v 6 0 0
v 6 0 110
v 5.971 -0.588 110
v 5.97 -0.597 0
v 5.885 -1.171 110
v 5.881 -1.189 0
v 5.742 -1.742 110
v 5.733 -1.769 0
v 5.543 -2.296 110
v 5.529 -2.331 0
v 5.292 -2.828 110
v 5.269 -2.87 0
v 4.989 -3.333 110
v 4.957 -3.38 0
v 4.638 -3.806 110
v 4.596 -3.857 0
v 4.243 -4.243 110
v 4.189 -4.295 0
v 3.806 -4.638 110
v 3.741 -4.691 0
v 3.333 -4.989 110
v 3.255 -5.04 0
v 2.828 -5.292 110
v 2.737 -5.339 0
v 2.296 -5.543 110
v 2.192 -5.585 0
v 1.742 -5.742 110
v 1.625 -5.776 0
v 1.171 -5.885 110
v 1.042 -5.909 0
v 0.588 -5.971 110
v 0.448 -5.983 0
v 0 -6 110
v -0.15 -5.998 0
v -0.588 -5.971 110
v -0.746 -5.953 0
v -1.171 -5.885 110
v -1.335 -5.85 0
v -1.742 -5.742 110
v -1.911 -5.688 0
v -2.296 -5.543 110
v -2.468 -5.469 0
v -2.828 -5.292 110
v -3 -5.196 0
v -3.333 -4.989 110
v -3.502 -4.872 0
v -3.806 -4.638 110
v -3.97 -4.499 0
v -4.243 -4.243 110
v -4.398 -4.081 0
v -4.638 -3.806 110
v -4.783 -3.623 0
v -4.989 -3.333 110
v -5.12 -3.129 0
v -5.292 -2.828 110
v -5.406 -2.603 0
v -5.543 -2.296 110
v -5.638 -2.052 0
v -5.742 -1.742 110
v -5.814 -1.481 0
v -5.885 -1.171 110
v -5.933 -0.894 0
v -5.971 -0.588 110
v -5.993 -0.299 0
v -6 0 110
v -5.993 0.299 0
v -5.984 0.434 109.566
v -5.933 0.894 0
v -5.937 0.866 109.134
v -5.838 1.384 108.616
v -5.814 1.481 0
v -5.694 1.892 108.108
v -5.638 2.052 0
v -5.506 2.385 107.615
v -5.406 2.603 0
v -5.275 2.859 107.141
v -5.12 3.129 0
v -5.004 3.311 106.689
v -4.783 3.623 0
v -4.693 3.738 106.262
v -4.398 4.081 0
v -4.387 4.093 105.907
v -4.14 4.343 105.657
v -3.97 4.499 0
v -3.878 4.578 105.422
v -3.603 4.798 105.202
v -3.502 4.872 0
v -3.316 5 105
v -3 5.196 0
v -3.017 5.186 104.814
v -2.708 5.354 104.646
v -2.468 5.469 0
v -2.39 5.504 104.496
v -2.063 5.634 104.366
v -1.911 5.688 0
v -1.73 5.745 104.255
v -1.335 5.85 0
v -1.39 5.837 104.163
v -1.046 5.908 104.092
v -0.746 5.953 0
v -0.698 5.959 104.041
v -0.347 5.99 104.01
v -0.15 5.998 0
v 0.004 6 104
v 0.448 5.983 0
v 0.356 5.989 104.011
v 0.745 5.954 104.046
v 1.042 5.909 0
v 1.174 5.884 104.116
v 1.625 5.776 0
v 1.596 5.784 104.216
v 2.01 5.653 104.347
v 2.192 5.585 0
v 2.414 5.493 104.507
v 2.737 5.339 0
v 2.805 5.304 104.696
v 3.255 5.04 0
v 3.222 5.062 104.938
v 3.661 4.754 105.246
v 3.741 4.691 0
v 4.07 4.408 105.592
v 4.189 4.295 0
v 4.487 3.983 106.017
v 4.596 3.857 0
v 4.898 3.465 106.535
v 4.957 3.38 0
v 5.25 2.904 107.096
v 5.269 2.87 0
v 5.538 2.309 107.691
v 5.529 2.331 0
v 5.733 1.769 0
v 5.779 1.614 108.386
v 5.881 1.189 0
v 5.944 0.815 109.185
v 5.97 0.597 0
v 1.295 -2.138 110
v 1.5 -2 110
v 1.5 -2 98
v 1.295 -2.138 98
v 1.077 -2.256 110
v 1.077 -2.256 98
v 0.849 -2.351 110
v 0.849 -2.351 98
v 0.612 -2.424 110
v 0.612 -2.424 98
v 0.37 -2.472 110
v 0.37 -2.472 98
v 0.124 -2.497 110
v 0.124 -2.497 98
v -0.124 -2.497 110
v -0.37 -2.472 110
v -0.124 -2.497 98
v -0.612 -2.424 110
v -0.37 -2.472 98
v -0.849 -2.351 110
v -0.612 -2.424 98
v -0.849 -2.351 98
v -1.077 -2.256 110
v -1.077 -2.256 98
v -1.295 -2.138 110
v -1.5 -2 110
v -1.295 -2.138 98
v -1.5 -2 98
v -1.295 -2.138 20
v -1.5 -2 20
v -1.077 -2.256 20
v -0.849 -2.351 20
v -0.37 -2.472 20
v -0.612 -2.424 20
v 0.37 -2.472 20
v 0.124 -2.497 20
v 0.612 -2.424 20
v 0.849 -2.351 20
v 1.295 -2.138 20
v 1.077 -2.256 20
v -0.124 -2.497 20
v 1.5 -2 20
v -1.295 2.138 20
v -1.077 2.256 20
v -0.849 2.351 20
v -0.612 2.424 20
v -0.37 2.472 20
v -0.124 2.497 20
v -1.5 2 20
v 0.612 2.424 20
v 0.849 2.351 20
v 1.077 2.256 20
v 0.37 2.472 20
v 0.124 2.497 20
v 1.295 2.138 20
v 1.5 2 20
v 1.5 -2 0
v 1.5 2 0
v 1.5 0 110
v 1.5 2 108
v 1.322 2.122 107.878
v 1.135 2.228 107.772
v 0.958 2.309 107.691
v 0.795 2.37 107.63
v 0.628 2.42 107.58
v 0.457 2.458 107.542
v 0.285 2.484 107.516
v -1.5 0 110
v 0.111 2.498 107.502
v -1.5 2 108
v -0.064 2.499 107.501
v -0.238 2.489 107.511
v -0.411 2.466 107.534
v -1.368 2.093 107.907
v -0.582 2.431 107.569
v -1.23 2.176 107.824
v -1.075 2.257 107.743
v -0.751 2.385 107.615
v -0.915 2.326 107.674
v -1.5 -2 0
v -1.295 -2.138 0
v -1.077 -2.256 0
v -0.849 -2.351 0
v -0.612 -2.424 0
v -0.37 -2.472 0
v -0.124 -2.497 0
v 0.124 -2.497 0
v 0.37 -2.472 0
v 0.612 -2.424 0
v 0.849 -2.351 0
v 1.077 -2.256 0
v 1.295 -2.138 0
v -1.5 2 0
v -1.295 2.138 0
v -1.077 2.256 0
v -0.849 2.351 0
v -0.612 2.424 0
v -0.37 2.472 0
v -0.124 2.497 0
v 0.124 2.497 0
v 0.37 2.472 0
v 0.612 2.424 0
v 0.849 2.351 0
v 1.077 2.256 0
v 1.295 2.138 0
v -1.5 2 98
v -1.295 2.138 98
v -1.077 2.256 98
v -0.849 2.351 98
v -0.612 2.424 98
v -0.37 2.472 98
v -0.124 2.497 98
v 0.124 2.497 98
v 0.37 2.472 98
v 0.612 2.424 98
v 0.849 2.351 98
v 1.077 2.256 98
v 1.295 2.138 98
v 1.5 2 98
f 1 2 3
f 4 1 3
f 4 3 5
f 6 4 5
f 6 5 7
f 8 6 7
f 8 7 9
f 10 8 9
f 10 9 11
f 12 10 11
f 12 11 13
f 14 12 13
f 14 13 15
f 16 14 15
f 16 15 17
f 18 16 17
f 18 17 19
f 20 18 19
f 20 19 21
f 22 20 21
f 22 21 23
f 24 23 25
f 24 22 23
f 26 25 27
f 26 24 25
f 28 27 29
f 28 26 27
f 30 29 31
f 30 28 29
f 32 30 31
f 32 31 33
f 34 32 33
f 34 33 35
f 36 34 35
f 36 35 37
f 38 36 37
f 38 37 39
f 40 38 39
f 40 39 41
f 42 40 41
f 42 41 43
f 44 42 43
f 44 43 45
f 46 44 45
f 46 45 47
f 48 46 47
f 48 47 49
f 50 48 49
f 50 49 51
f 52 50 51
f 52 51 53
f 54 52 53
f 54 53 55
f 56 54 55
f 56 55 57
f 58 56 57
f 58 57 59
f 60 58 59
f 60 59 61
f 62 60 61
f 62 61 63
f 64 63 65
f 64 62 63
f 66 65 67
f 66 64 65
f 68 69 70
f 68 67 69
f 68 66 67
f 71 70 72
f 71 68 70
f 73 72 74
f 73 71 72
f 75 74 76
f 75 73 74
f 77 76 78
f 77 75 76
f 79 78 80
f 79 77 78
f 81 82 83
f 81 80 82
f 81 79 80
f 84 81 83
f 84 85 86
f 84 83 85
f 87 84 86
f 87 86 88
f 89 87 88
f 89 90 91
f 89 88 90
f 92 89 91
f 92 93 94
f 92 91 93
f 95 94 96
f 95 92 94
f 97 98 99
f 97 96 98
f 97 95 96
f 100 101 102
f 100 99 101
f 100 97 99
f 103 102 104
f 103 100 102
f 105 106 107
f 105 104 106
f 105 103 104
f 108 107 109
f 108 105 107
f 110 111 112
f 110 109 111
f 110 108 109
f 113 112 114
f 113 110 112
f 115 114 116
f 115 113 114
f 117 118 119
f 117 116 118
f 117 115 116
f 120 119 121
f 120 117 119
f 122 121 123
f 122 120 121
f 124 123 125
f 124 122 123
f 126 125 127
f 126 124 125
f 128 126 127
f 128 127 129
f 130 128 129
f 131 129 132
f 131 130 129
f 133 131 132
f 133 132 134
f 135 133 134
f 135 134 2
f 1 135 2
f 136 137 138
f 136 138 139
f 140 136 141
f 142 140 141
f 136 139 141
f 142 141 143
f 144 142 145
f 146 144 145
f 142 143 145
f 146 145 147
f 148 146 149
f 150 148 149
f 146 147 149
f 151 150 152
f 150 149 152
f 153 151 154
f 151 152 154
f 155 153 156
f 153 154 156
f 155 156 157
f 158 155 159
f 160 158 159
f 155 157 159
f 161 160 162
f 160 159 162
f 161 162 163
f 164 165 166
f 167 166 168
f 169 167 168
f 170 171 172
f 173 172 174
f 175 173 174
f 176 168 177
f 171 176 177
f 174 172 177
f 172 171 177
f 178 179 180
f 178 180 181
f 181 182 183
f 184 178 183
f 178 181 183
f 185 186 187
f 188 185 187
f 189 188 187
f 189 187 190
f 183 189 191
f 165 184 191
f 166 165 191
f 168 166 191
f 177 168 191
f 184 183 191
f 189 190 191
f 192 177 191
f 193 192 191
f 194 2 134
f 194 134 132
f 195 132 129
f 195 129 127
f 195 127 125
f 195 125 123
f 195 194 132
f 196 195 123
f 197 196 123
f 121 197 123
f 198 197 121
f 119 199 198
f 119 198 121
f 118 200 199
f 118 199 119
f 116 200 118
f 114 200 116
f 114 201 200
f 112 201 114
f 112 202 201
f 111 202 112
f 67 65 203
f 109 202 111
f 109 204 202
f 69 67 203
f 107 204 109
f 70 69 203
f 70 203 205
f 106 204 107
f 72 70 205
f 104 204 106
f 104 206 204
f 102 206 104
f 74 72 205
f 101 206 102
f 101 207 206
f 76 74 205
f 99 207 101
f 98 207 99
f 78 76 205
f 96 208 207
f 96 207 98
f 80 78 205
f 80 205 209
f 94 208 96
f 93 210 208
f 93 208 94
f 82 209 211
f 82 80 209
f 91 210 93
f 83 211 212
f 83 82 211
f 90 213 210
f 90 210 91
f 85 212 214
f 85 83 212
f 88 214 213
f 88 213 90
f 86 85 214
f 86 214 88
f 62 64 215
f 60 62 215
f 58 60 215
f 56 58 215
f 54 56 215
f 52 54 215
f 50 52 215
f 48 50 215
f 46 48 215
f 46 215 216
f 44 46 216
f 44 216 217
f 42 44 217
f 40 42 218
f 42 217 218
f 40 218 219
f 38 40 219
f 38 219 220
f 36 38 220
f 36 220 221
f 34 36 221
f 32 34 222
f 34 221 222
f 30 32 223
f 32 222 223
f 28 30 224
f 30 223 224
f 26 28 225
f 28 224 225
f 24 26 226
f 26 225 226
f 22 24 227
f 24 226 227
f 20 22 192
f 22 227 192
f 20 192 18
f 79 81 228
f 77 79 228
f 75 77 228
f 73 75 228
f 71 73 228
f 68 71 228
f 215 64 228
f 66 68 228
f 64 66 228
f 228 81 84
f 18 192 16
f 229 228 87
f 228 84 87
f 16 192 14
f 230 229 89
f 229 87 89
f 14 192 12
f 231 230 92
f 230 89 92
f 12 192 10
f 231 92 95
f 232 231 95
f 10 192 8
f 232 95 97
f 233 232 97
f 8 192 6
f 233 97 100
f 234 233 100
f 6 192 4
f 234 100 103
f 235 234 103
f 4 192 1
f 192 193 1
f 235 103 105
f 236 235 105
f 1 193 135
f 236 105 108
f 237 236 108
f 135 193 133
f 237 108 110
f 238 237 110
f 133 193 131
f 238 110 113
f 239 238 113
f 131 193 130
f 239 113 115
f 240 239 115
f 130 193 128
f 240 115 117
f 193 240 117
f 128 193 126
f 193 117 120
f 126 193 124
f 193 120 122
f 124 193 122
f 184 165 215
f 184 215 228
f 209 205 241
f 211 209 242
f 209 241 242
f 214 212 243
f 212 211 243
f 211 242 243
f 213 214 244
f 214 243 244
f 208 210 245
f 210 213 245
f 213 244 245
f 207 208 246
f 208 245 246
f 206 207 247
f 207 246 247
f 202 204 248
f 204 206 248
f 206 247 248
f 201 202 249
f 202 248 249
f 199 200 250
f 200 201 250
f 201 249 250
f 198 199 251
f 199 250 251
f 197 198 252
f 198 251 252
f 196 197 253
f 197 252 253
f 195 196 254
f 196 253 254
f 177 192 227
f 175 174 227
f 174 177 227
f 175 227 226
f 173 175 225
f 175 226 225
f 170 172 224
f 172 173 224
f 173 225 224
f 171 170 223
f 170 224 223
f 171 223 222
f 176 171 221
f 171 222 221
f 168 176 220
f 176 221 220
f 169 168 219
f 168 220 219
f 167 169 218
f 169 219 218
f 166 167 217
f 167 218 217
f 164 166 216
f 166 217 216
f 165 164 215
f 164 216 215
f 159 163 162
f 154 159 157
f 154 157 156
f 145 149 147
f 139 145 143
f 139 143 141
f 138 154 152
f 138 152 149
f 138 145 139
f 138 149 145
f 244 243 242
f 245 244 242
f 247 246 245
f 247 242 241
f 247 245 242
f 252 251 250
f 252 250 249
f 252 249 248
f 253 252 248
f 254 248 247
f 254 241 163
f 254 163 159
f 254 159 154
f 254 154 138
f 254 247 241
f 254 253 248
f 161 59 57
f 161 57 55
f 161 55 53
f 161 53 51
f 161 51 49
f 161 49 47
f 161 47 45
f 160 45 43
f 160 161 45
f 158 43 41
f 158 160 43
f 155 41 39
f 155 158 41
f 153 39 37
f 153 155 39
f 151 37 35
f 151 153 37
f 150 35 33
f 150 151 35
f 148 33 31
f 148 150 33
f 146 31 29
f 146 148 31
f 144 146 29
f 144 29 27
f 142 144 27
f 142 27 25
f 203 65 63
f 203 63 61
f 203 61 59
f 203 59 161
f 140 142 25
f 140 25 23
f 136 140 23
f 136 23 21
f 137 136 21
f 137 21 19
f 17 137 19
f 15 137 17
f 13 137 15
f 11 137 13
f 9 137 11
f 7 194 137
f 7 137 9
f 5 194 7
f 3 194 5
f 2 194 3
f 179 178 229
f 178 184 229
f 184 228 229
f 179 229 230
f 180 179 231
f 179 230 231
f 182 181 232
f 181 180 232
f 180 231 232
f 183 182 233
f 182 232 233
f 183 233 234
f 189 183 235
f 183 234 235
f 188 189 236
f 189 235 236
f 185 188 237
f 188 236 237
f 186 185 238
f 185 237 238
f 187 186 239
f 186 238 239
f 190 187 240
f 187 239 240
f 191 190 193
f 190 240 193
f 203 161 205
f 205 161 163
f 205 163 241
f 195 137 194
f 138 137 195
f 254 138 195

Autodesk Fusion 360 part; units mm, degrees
sketch "Skizze1" plane through (0, 0, 0) normal (0, 0, 1) x (1, 0, 0)
  point P0 (-5.2, 16.4)
sketch "Skizze2" plane through (0, 0, 0) normal (0, 0, 1) x (1, 0, 0)
  circle A0 centre (0, 0) radius 6
extrude "Extrusion2" add sketch "Skizze2" along normal blind 110
sketch "Skizze3" plane through (0, 0, 0) normal (0, 0, 1) x (1, 0, 0)
  line L0 (-1.5, -2) -> (-1.5, 2)
  line L1 (1.5, -2) -> (1.5, 2)
  arc A0 (-1.5, -2) -> (1.5, -2) centre (0, 0) ccw
  arc A1 (1.5, 2) -> (-1.5, 2) centre (0, 0) ccw
  dimension "d15" = 5
extrude "Extrusion3" cut sketch "Skizze3" along normal blind 20
pattern_linear "R-Anordnung1" count 2 spacing 98 along (0, 0, 1) of "Extrusion3"
ref_plane "Arbeitsebene1" through (-6, 0, 108.0306) normal (-1, 0, 0) x (0, 1, 0)
sketch "Skizze5" plane through (-6, 0, 0) normal (-1, 0, 0) x (0, -1, 0)
  line L0 (0, 110) -> (-6.178, 103.822)
  line L1 (-6.178, 103.822) -> (-6.178, 110)
  line L2 (-6.178, 110) -> (0, 110)
extrude "Extrusion4" cut sketch "Skizze5" against normal blind 100
